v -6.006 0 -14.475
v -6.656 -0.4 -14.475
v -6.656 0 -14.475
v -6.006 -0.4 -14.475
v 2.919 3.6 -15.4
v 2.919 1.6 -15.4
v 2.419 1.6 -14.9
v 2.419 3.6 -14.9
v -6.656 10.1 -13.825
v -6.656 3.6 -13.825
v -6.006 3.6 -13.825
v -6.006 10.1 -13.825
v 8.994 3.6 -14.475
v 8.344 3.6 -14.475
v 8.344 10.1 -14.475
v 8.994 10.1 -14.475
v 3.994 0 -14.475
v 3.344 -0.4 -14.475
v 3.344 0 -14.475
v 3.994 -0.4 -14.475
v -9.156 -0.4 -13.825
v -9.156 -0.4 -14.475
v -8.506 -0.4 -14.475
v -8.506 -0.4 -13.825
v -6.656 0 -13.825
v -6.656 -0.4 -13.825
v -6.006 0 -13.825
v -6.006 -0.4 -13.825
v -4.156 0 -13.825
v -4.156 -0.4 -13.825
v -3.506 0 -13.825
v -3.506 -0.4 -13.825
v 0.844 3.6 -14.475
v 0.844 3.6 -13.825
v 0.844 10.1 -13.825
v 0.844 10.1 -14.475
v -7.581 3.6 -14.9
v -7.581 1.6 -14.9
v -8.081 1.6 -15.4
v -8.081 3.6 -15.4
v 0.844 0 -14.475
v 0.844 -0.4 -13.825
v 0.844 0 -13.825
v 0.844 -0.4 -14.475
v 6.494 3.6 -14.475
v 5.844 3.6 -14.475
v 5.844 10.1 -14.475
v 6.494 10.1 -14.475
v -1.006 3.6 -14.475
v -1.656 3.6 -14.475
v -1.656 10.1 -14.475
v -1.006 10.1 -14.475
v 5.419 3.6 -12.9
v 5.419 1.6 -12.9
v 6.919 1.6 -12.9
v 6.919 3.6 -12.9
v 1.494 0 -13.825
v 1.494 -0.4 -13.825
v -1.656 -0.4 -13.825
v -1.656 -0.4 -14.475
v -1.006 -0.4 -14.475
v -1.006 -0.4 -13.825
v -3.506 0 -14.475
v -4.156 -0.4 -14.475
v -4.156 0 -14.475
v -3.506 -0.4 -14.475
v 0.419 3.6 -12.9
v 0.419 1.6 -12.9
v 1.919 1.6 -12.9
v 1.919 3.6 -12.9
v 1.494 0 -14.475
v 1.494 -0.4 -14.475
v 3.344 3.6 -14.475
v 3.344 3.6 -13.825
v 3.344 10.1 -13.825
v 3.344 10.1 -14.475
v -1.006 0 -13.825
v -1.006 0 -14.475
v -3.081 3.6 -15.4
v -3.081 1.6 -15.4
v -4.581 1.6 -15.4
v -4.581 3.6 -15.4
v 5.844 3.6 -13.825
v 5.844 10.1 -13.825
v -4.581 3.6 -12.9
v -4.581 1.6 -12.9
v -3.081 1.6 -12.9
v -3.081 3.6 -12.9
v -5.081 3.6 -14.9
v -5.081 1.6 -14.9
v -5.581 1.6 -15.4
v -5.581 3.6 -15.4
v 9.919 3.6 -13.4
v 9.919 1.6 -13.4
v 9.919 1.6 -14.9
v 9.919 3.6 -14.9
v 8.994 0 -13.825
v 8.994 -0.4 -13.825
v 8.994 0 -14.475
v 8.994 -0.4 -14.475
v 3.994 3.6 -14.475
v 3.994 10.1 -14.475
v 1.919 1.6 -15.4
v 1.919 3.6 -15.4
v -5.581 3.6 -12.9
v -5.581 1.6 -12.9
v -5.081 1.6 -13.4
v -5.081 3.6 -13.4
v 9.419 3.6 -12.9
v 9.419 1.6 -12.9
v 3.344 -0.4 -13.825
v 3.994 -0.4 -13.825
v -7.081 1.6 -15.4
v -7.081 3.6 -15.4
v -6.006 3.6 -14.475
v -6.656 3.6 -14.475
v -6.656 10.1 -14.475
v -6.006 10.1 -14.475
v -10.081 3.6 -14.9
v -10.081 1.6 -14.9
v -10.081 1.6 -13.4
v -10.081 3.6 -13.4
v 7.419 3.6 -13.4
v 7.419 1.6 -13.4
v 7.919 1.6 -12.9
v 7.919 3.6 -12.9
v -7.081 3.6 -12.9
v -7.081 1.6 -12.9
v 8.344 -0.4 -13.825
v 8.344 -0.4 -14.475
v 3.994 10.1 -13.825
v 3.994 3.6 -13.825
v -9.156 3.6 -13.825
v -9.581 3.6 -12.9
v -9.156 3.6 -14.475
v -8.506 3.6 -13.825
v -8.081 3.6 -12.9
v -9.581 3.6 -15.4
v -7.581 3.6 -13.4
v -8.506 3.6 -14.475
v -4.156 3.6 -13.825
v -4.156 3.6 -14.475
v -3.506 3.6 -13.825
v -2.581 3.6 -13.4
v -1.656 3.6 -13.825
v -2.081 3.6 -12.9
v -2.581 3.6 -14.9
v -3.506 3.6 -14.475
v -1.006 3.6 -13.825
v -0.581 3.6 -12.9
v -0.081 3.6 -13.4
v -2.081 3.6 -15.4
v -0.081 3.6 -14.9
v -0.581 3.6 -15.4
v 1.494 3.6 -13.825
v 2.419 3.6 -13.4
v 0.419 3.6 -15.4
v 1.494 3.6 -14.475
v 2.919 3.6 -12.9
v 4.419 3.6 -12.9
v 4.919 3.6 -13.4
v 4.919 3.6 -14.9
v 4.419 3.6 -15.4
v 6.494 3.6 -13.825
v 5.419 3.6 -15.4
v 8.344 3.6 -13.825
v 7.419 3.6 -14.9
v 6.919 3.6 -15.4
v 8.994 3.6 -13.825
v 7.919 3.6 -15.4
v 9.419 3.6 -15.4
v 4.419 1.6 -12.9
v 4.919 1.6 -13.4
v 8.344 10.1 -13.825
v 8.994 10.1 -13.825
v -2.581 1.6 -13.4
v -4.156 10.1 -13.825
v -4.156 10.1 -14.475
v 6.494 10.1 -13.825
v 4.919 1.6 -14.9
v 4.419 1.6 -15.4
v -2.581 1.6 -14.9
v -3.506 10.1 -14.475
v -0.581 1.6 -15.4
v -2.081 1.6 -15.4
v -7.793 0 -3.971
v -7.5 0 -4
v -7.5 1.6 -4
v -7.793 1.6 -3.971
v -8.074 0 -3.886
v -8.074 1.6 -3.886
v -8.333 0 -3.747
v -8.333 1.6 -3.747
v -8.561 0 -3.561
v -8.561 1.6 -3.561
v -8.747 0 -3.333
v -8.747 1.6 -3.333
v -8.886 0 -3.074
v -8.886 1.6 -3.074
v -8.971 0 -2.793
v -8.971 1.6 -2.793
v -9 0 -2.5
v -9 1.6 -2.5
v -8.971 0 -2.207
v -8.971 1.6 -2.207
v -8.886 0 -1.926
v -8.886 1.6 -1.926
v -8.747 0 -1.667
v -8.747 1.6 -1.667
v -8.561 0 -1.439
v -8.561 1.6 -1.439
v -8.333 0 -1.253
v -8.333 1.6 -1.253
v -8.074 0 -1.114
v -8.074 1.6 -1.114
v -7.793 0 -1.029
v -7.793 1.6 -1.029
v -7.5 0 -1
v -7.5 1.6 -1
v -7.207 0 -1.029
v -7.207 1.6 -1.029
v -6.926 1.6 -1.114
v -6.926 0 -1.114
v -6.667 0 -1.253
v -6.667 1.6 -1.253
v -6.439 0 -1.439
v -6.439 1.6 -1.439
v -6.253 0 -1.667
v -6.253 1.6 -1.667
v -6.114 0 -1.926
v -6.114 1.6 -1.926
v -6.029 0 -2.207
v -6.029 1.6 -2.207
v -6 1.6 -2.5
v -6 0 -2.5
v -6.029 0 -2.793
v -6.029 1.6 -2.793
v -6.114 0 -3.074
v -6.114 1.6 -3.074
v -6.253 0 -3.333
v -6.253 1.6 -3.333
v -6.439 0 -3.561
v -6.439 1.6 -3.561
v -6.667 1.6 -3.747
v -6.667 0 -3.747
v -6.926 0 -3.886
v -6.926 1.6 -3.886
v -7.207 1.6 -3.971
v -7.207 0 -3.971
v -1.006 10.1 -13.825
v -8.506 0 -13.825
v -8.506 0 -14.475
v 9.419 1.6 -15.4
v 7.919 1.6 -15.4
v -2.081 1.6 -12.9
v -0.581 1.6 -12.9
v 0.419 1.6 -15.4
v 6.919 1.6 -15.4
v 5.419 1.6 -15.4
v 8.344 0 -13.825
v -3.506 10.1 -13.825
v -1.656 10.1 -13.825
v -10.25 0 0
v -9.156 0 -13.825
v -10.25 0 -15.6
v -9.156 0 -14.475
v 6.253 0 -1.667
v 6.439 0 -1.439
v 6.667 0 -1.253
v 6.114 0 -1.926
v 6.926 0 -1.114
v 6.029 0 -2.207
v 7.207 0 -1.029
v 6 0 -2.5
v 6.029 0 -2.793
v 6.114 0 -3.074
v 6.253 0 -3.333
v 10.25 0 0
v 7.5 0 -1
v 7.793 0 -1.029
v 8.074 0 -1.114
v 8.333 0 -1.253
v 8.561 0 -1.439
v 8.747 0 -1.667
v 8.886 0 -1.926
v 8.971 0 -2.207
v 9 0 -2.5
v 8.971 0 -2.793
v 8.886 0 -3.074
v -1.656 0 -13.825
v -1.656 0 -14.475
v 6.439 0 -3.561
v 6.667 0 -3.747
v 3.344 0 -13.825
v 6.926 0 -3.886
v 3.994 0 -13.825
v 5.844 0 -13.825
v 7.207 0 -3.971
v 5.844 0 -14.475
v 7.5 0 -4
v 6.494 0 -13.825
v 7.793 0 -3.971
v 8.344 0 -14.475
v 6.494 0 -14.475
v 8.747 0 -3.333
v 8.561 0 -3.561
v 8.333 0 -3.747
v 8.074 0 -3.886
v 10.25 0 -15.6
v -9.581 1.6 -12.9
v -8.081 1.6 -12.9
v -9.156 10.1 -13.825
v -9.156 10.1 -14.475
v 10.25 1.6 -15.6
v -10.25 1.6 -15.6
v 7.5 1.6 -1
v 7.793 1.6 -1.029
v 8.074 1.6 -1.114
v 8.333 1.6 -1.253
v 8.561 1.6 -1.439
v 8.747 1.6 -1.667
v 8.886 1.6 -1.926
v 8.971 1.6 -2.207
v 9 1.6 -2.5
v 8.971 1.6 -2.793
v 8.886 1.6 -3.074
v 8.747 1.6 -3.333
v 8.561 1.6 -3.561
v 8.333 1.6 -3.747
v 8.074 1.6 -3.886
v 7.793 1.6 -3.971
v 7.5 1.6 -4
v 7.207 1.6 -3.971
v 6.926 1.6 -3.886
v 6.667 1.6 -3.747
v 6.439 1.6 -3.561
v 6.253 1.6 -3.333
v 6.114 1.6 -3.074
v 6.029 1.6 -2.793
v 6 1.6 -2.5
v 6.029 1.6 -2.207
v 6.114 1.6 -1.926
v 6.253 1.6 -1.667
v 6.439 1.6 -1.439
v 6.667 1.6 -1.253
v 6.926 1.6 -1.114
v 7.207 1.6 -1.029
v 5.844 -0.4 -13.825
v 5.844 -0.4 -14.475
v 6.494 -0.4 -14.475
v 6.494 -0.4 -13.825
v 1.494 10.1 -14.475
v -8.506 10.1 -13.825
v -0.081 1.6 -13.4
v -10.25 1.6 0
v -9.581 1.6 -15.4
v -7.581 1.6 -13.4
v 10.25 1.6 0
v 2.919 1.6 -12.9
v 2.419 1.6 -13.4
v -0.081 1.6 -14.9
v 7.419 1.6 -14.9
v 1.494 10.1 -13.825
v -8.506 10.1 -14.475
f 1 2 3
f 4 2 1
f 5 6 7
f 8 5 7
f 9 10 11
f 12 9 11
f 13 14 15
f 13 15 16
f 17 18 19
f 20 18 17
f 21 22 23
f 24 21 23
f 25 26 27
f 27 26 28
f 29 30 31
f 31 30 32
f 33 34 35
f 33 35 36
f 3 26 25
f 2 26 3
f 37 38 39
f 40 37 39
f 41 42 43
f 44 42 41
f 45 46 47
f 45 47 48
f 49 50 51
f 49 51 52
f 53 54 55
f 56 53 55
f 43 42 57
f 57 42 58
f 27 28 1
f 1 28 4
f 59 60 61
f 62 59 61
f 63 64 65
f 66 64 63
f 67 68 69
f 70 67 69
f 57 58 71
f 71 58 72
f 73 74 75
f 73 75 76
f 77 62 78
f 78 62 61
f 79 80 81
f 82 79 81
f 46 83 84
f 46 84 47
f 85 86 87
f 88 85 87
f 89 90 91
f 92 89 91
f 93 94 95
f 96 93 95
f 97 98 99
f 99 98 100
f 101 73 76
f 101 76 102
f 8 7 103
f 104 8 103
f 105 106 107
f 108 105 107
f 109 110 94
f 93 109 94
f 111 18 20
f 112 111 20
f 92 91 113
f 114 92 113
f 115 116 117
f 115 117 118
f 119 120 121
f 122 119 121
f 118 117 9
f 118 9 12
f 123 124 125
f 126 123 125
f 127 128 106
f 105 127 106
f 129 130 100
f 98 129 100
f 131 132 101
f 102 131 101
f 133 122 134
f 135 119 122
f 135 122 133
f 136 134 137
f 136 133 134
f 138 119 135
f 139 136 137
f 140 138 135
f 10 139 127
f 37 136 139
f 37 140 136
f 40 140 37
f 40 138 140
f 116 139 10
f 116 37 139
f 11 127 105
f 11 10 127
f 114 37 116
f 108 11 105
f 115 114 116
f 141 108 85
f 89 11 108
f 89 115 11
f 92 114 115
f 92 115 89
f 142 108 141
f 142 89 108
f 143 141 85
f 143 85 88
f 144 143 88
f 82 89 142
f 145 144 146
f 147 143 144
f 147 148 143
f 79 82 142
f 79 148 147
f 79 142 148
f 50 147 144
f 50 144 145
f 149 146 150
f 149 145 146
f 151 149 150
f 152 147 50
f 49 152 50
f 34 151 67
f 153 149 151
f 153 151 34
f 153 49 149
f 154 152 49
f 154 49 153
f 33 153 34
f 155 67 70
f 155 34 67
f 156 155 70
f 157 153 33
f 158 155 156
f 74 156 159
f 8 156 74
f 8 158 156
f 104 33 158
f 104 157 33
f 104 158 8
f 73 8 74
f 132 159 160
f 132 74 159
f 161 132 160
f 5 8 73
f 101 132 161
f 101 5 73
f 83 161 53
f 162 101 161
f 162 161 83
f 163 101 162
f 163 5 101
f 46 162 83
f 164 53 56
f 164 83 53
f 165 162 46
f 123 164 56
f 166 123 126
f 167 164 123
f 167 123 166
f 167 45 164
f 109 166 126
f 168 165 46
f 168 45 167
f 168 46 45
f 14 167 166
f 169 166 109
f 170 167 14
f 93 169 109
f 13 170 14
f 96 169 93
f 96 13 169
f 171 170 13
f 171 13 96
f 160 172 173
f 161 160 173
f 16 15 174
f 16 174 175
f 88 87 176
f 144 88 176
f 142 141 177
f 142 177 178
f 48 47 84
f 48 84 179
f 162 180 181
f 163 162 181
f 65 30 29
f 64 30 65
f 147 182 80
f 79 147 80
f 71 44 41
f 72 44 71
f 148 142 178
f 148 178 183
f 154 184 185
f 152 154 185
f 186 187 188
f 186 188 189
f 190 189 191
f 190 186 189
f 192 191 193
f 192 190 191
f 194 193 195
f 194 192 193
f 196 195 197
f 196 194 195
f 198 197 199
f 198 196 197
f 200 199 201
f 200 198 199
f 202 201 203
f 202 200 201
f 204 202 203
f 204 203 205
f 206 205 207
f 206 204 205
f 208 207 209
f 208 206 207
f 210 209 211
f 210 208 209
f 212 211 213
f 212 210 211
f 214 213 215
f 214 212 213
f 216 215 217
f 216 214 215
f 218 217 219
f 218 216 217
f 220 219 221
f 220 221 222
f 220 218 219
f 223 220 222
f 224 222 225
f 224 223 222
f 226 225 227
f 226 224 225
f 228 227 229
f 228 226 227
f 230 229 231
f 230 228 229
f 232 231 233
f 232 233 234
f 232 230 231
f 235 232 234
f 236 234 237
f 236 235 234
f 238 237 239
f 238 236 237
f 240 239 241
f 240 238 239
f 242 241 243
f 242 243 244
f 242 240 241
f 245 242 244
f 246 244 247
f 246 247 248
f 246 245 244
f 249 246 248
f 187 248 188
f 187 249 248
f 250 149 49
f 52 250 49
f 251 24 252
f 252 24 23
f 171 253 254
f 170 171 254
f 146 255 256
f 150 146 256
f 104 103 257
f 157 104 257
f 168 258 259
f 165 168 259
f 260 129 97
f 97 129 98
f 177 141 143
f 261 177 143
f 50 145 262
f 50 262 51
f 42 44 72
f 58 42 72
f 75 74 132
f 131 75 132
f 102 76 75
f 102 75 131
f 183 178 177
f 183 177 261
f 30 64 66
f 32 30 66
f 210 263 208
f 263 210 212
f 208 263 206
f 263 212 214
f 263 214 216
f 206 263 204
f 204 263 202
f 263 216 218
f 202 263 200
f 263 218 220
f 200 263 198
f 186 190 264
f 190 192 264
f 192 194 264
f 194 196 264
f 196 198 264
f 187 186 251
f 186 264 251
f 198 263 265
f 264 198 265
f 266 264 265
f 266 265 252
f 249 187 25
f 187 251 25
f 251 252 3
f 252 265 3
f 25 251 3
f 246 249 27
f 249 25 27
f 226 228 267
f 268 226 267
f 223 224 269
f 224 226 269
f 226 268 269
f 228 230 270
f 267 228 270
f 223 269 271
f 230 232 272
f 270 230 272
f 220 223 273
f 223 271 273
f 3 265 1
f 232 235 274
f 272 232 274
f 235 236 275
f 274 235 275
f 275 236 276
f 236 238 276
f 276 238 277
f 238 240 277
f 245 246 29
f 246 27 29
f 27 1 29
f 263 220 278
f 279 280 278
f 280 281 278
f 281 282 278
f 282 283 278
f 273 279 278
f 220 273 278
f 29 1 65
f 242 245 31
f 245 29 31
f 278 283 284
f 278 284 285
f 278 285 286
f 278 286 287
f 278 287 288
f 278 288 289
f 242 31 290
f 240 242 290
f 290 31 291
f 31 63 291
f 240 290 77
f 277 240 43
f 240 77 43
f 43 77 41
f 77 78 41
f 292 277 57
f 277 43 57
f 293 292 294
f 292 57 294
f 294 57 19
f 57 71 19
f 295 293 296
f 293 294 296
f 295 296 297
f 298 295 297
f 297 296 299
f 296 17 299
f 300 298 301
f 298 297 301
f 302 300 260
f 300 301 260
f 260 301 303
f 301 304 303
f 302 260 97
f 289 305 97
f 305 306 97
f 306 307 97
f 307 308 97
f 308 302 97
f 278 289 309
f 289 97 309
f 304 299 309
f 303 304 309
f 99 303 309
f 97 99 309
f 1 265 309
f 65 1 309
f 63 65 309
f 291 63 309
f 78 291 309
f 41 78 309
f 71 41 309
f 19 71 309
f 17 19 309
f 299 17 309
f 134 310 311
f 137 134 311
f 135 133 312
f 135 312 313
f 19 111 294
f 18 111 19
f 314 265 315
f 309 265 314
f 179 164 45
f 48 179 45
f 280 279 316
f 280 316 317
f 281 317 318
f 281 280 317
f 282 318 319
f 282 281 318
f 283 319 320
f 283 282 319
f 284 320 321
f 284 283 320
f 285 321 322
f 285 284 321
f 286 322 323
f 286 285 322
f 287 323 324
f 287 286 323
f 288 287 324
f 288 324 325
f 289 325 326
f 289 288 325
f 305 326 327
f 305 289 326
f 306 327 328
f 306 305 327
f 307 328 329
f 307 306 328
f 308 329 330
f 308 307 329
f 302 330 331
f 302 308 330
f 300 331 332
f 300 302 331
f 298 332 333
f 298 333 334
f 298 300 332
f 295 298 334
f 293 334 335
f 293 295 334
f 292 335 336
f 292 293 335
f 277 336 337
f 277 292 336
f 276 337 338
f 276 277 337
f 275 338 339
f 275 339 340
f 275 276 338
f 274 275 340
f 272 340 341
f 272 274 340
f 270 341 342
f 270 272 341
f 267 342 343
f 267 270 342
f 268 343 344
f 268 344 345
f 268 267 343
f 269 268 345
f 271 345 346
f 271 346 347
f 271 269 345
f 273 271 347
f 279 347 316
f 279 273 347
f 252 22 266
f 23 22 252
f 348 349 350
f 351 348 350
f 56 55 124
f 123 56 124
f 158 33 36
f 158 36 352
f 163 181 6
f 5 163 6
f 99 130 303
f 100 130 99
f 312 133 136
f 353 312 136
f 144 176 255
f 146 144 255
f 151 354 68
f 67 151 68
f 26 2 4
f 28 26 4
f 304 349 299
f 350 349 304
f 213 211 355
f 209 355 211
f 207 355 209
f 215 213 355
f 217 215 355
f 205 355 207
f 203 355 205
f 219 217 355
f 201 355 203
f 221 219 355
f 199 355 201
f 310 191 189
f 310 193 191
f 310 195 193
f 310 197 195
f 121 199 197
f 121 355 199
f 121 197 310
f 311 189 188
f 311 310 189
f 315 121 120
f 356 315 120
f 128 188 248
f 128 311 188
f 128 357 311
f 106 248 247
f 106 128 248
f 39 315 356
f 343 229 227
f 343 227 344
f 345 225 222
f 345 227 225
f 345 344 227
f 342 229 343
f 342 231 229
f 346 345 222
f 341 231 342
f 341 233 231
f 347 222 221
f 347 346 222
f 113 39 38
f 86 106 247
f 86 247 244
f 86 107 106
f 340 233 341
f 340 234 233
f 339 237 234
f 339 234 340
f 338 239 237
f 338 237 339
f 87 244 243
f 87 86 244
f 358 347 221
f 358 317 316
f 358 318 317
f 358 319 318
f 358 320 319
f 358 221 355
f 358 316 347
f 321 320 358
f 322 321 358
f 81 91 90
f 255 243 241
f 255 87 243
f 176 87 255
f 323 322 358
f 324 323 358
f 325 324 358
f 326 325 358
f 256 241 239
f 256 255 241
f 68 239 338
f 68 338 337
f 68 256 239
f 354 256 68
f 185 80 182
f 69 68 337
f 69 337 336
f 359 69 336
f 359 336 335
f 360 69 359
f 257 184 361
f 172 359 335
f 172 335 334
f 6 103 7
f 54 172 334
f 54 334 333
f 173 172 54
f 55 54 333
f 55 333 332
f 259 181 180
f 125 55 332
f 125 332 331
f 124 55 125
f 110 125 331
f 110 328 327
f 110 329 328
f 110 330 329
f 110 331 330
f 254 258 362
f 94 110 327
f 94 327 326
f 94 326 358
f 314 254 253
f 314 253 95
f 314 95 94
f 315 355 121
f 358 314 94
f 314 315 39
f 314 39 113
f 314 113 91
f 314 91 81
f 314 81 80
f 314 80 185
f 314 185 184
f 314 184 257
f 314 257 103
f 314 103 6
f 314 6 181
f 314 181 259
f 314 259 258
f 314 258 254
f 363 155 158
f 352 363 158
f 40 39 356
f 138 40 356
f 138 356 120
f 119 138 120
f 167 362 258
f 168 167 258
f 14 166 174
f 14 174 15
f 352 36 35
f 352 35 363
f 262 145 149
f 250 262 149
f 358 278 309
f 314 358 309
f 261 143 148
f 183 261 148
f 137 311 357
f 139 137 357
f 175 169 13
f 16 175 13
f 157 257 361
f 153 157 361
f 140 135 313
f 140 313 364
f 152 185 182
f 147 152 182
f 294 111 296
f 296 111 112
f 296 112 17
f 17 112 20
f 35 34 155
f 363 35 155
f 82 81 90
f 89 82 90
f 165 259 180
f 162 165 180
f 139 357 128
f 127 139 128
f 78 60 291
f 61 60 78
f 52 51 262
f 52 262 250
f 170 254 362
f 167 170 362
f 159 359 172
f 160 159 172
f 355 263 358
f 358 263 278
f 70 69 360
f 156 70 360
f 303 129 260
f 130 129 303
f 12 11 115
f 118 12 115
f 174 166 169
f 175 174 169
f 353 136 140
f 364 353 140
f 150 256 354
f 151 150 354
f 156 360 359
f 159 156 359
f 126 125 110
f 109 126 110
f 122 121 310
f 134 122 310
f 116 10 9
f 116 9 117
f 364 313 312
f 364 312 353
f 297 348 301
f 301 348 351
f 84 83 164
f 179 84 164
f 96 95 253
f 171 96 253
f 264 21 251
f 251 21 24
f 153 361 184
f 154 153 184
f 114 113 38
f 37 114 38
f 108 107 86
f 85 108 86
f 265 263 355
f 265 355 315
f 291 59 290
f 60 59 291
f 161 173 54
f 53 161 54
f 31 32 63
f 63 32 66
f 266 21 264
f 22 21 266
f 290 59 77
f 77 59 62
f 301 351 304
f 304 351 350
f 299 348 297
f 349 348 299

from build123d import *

# Parameters (mm, degrees)
SKETCH1_W           = 20.5
SKETCH1_H           = 15.6
SKETCH1_R           = 1.5
BOSS_EXTRUDE1_DEPTH = 1.6
BOSS_EXTRUDE2_DEPTH = 2
BOSS_EXTRUDE3_START = -4
SKETCH3_W           = 0.65
SKETCH3_H           = 0.65
BOSS_EXTRUDE3_DEPTH = 10.5
LPATTERN1_COUNT     = 8
LPATTERN1_PITCH     = 2.5


with BuildPart() as part:
    # Sketch1 → Boss-Extrude1 (new body)
    with BuildSketch(Plane(origin=(0, 0, 0), x_dir=(1, 0, 0), z_dir=(0, 1, 0))):
        with Locations((0, 7.8)):
            Rectangle(SKETCH1_W, SKETCH1_H)
        with Locations(Location((7.5, 2.5, 0), (0, 0, 270))):
            Circle(SKETCH1_R, mode=Mode.SUBTRACT)
        with Locations(Location((-7.5, 2.5, 0), (0, 0, 90))):
            Circle(SKETCH1_R, mode=Mode.SUBTRACT)
    extrude(amount=BOSS_EXTRUDE1_DEPTH)

    # Sketch2 → Boss-Extrude2 (add)
    with BuildSketch(Plane(origin=(0, 1.6, 0), x_dir=(1, 0, 0), z_dir=(0, 1, 0))):
        Polygon((7.918720213, 15.4), (7.418720213, 14.9), (6.918720213, 15.4), (5.418720213, 15.4), (4.918720213, 14.9), (4.418720213, 15.4), (2.918720213, 15.4), (2.418720213, 14.9), (1.918720213, 15.4), (0.418720213, 15.4), (-0.081279787, 14.9), (-0.581279787, 15.4), (-2.081279787, 15.4), (-2.581279787, 14.9), (-3.081279787, 15.4), (-4.581279787, 15.4), (-5.081279787, 14.9), (-5.581279787, 15.4), (-7.081279787, 15.4), (-7.581279787, 14.9), (-8.081279787, 15.4), (-9.581279787, 15.4), (-10.081279787, 14.9), (-10.081279787, 13.4), (-9.581279787, 12.9), (-8.081279787, 12.9), (-7.581279787, 13.4), (-7.081279787, 12.9), (-5.581279787, 12.9), (-5.081279787, 13.4), (-4.581279787, 12.9), (-3.081279787, 12.9), (-2.581279787, 13.4), (-2.081279787, 12.9), (-0.581279787, 12.9), (-0.081279787, 13.4), (0.418720213, 12.9), (1.918720213, 12.9), (2.418720213, 13.4), (2.918720213, 12.9), (4.418720213, 12.9), (4.918720213, 13.4), (5.418720213, 12.9), (6.918720213, 12.9), (7.418720213, 13.4), (7.918720213, 12.9), (9.418720213, 12.9), (9.918720213, 13.4), (9.918720213, 14.9), (9.418720213, 15.4), align=None)
    extrude(amount=BOSS_EXTRUDE2_DEPTH)

    # Sketch3 → Boss-Extrude3 (add)
    with BuildSketch(Plane(origin=(0, 3.6, 0), x_dir=(1, 0, 0), z_dir=(0, 1, 0)).offset(BOSS_EXTRUDE3_START)):
        with Locations((8.668720213, 14.15)):
            Rectangle(SKETCH3_W, SKETCH3_H)
    boss_extrude3 = extrude(amount=BOSS_EXTRUDE3_DEPTH)

    # LPattern1: Boss-Extrude3 ×8
    with Locations(*[(-i * LPATTERN1_PITCH, 0, 0) for i in range(1, LPATTERN1_COUNT)]):
        add(boss_extrude3)


solid = part.part
